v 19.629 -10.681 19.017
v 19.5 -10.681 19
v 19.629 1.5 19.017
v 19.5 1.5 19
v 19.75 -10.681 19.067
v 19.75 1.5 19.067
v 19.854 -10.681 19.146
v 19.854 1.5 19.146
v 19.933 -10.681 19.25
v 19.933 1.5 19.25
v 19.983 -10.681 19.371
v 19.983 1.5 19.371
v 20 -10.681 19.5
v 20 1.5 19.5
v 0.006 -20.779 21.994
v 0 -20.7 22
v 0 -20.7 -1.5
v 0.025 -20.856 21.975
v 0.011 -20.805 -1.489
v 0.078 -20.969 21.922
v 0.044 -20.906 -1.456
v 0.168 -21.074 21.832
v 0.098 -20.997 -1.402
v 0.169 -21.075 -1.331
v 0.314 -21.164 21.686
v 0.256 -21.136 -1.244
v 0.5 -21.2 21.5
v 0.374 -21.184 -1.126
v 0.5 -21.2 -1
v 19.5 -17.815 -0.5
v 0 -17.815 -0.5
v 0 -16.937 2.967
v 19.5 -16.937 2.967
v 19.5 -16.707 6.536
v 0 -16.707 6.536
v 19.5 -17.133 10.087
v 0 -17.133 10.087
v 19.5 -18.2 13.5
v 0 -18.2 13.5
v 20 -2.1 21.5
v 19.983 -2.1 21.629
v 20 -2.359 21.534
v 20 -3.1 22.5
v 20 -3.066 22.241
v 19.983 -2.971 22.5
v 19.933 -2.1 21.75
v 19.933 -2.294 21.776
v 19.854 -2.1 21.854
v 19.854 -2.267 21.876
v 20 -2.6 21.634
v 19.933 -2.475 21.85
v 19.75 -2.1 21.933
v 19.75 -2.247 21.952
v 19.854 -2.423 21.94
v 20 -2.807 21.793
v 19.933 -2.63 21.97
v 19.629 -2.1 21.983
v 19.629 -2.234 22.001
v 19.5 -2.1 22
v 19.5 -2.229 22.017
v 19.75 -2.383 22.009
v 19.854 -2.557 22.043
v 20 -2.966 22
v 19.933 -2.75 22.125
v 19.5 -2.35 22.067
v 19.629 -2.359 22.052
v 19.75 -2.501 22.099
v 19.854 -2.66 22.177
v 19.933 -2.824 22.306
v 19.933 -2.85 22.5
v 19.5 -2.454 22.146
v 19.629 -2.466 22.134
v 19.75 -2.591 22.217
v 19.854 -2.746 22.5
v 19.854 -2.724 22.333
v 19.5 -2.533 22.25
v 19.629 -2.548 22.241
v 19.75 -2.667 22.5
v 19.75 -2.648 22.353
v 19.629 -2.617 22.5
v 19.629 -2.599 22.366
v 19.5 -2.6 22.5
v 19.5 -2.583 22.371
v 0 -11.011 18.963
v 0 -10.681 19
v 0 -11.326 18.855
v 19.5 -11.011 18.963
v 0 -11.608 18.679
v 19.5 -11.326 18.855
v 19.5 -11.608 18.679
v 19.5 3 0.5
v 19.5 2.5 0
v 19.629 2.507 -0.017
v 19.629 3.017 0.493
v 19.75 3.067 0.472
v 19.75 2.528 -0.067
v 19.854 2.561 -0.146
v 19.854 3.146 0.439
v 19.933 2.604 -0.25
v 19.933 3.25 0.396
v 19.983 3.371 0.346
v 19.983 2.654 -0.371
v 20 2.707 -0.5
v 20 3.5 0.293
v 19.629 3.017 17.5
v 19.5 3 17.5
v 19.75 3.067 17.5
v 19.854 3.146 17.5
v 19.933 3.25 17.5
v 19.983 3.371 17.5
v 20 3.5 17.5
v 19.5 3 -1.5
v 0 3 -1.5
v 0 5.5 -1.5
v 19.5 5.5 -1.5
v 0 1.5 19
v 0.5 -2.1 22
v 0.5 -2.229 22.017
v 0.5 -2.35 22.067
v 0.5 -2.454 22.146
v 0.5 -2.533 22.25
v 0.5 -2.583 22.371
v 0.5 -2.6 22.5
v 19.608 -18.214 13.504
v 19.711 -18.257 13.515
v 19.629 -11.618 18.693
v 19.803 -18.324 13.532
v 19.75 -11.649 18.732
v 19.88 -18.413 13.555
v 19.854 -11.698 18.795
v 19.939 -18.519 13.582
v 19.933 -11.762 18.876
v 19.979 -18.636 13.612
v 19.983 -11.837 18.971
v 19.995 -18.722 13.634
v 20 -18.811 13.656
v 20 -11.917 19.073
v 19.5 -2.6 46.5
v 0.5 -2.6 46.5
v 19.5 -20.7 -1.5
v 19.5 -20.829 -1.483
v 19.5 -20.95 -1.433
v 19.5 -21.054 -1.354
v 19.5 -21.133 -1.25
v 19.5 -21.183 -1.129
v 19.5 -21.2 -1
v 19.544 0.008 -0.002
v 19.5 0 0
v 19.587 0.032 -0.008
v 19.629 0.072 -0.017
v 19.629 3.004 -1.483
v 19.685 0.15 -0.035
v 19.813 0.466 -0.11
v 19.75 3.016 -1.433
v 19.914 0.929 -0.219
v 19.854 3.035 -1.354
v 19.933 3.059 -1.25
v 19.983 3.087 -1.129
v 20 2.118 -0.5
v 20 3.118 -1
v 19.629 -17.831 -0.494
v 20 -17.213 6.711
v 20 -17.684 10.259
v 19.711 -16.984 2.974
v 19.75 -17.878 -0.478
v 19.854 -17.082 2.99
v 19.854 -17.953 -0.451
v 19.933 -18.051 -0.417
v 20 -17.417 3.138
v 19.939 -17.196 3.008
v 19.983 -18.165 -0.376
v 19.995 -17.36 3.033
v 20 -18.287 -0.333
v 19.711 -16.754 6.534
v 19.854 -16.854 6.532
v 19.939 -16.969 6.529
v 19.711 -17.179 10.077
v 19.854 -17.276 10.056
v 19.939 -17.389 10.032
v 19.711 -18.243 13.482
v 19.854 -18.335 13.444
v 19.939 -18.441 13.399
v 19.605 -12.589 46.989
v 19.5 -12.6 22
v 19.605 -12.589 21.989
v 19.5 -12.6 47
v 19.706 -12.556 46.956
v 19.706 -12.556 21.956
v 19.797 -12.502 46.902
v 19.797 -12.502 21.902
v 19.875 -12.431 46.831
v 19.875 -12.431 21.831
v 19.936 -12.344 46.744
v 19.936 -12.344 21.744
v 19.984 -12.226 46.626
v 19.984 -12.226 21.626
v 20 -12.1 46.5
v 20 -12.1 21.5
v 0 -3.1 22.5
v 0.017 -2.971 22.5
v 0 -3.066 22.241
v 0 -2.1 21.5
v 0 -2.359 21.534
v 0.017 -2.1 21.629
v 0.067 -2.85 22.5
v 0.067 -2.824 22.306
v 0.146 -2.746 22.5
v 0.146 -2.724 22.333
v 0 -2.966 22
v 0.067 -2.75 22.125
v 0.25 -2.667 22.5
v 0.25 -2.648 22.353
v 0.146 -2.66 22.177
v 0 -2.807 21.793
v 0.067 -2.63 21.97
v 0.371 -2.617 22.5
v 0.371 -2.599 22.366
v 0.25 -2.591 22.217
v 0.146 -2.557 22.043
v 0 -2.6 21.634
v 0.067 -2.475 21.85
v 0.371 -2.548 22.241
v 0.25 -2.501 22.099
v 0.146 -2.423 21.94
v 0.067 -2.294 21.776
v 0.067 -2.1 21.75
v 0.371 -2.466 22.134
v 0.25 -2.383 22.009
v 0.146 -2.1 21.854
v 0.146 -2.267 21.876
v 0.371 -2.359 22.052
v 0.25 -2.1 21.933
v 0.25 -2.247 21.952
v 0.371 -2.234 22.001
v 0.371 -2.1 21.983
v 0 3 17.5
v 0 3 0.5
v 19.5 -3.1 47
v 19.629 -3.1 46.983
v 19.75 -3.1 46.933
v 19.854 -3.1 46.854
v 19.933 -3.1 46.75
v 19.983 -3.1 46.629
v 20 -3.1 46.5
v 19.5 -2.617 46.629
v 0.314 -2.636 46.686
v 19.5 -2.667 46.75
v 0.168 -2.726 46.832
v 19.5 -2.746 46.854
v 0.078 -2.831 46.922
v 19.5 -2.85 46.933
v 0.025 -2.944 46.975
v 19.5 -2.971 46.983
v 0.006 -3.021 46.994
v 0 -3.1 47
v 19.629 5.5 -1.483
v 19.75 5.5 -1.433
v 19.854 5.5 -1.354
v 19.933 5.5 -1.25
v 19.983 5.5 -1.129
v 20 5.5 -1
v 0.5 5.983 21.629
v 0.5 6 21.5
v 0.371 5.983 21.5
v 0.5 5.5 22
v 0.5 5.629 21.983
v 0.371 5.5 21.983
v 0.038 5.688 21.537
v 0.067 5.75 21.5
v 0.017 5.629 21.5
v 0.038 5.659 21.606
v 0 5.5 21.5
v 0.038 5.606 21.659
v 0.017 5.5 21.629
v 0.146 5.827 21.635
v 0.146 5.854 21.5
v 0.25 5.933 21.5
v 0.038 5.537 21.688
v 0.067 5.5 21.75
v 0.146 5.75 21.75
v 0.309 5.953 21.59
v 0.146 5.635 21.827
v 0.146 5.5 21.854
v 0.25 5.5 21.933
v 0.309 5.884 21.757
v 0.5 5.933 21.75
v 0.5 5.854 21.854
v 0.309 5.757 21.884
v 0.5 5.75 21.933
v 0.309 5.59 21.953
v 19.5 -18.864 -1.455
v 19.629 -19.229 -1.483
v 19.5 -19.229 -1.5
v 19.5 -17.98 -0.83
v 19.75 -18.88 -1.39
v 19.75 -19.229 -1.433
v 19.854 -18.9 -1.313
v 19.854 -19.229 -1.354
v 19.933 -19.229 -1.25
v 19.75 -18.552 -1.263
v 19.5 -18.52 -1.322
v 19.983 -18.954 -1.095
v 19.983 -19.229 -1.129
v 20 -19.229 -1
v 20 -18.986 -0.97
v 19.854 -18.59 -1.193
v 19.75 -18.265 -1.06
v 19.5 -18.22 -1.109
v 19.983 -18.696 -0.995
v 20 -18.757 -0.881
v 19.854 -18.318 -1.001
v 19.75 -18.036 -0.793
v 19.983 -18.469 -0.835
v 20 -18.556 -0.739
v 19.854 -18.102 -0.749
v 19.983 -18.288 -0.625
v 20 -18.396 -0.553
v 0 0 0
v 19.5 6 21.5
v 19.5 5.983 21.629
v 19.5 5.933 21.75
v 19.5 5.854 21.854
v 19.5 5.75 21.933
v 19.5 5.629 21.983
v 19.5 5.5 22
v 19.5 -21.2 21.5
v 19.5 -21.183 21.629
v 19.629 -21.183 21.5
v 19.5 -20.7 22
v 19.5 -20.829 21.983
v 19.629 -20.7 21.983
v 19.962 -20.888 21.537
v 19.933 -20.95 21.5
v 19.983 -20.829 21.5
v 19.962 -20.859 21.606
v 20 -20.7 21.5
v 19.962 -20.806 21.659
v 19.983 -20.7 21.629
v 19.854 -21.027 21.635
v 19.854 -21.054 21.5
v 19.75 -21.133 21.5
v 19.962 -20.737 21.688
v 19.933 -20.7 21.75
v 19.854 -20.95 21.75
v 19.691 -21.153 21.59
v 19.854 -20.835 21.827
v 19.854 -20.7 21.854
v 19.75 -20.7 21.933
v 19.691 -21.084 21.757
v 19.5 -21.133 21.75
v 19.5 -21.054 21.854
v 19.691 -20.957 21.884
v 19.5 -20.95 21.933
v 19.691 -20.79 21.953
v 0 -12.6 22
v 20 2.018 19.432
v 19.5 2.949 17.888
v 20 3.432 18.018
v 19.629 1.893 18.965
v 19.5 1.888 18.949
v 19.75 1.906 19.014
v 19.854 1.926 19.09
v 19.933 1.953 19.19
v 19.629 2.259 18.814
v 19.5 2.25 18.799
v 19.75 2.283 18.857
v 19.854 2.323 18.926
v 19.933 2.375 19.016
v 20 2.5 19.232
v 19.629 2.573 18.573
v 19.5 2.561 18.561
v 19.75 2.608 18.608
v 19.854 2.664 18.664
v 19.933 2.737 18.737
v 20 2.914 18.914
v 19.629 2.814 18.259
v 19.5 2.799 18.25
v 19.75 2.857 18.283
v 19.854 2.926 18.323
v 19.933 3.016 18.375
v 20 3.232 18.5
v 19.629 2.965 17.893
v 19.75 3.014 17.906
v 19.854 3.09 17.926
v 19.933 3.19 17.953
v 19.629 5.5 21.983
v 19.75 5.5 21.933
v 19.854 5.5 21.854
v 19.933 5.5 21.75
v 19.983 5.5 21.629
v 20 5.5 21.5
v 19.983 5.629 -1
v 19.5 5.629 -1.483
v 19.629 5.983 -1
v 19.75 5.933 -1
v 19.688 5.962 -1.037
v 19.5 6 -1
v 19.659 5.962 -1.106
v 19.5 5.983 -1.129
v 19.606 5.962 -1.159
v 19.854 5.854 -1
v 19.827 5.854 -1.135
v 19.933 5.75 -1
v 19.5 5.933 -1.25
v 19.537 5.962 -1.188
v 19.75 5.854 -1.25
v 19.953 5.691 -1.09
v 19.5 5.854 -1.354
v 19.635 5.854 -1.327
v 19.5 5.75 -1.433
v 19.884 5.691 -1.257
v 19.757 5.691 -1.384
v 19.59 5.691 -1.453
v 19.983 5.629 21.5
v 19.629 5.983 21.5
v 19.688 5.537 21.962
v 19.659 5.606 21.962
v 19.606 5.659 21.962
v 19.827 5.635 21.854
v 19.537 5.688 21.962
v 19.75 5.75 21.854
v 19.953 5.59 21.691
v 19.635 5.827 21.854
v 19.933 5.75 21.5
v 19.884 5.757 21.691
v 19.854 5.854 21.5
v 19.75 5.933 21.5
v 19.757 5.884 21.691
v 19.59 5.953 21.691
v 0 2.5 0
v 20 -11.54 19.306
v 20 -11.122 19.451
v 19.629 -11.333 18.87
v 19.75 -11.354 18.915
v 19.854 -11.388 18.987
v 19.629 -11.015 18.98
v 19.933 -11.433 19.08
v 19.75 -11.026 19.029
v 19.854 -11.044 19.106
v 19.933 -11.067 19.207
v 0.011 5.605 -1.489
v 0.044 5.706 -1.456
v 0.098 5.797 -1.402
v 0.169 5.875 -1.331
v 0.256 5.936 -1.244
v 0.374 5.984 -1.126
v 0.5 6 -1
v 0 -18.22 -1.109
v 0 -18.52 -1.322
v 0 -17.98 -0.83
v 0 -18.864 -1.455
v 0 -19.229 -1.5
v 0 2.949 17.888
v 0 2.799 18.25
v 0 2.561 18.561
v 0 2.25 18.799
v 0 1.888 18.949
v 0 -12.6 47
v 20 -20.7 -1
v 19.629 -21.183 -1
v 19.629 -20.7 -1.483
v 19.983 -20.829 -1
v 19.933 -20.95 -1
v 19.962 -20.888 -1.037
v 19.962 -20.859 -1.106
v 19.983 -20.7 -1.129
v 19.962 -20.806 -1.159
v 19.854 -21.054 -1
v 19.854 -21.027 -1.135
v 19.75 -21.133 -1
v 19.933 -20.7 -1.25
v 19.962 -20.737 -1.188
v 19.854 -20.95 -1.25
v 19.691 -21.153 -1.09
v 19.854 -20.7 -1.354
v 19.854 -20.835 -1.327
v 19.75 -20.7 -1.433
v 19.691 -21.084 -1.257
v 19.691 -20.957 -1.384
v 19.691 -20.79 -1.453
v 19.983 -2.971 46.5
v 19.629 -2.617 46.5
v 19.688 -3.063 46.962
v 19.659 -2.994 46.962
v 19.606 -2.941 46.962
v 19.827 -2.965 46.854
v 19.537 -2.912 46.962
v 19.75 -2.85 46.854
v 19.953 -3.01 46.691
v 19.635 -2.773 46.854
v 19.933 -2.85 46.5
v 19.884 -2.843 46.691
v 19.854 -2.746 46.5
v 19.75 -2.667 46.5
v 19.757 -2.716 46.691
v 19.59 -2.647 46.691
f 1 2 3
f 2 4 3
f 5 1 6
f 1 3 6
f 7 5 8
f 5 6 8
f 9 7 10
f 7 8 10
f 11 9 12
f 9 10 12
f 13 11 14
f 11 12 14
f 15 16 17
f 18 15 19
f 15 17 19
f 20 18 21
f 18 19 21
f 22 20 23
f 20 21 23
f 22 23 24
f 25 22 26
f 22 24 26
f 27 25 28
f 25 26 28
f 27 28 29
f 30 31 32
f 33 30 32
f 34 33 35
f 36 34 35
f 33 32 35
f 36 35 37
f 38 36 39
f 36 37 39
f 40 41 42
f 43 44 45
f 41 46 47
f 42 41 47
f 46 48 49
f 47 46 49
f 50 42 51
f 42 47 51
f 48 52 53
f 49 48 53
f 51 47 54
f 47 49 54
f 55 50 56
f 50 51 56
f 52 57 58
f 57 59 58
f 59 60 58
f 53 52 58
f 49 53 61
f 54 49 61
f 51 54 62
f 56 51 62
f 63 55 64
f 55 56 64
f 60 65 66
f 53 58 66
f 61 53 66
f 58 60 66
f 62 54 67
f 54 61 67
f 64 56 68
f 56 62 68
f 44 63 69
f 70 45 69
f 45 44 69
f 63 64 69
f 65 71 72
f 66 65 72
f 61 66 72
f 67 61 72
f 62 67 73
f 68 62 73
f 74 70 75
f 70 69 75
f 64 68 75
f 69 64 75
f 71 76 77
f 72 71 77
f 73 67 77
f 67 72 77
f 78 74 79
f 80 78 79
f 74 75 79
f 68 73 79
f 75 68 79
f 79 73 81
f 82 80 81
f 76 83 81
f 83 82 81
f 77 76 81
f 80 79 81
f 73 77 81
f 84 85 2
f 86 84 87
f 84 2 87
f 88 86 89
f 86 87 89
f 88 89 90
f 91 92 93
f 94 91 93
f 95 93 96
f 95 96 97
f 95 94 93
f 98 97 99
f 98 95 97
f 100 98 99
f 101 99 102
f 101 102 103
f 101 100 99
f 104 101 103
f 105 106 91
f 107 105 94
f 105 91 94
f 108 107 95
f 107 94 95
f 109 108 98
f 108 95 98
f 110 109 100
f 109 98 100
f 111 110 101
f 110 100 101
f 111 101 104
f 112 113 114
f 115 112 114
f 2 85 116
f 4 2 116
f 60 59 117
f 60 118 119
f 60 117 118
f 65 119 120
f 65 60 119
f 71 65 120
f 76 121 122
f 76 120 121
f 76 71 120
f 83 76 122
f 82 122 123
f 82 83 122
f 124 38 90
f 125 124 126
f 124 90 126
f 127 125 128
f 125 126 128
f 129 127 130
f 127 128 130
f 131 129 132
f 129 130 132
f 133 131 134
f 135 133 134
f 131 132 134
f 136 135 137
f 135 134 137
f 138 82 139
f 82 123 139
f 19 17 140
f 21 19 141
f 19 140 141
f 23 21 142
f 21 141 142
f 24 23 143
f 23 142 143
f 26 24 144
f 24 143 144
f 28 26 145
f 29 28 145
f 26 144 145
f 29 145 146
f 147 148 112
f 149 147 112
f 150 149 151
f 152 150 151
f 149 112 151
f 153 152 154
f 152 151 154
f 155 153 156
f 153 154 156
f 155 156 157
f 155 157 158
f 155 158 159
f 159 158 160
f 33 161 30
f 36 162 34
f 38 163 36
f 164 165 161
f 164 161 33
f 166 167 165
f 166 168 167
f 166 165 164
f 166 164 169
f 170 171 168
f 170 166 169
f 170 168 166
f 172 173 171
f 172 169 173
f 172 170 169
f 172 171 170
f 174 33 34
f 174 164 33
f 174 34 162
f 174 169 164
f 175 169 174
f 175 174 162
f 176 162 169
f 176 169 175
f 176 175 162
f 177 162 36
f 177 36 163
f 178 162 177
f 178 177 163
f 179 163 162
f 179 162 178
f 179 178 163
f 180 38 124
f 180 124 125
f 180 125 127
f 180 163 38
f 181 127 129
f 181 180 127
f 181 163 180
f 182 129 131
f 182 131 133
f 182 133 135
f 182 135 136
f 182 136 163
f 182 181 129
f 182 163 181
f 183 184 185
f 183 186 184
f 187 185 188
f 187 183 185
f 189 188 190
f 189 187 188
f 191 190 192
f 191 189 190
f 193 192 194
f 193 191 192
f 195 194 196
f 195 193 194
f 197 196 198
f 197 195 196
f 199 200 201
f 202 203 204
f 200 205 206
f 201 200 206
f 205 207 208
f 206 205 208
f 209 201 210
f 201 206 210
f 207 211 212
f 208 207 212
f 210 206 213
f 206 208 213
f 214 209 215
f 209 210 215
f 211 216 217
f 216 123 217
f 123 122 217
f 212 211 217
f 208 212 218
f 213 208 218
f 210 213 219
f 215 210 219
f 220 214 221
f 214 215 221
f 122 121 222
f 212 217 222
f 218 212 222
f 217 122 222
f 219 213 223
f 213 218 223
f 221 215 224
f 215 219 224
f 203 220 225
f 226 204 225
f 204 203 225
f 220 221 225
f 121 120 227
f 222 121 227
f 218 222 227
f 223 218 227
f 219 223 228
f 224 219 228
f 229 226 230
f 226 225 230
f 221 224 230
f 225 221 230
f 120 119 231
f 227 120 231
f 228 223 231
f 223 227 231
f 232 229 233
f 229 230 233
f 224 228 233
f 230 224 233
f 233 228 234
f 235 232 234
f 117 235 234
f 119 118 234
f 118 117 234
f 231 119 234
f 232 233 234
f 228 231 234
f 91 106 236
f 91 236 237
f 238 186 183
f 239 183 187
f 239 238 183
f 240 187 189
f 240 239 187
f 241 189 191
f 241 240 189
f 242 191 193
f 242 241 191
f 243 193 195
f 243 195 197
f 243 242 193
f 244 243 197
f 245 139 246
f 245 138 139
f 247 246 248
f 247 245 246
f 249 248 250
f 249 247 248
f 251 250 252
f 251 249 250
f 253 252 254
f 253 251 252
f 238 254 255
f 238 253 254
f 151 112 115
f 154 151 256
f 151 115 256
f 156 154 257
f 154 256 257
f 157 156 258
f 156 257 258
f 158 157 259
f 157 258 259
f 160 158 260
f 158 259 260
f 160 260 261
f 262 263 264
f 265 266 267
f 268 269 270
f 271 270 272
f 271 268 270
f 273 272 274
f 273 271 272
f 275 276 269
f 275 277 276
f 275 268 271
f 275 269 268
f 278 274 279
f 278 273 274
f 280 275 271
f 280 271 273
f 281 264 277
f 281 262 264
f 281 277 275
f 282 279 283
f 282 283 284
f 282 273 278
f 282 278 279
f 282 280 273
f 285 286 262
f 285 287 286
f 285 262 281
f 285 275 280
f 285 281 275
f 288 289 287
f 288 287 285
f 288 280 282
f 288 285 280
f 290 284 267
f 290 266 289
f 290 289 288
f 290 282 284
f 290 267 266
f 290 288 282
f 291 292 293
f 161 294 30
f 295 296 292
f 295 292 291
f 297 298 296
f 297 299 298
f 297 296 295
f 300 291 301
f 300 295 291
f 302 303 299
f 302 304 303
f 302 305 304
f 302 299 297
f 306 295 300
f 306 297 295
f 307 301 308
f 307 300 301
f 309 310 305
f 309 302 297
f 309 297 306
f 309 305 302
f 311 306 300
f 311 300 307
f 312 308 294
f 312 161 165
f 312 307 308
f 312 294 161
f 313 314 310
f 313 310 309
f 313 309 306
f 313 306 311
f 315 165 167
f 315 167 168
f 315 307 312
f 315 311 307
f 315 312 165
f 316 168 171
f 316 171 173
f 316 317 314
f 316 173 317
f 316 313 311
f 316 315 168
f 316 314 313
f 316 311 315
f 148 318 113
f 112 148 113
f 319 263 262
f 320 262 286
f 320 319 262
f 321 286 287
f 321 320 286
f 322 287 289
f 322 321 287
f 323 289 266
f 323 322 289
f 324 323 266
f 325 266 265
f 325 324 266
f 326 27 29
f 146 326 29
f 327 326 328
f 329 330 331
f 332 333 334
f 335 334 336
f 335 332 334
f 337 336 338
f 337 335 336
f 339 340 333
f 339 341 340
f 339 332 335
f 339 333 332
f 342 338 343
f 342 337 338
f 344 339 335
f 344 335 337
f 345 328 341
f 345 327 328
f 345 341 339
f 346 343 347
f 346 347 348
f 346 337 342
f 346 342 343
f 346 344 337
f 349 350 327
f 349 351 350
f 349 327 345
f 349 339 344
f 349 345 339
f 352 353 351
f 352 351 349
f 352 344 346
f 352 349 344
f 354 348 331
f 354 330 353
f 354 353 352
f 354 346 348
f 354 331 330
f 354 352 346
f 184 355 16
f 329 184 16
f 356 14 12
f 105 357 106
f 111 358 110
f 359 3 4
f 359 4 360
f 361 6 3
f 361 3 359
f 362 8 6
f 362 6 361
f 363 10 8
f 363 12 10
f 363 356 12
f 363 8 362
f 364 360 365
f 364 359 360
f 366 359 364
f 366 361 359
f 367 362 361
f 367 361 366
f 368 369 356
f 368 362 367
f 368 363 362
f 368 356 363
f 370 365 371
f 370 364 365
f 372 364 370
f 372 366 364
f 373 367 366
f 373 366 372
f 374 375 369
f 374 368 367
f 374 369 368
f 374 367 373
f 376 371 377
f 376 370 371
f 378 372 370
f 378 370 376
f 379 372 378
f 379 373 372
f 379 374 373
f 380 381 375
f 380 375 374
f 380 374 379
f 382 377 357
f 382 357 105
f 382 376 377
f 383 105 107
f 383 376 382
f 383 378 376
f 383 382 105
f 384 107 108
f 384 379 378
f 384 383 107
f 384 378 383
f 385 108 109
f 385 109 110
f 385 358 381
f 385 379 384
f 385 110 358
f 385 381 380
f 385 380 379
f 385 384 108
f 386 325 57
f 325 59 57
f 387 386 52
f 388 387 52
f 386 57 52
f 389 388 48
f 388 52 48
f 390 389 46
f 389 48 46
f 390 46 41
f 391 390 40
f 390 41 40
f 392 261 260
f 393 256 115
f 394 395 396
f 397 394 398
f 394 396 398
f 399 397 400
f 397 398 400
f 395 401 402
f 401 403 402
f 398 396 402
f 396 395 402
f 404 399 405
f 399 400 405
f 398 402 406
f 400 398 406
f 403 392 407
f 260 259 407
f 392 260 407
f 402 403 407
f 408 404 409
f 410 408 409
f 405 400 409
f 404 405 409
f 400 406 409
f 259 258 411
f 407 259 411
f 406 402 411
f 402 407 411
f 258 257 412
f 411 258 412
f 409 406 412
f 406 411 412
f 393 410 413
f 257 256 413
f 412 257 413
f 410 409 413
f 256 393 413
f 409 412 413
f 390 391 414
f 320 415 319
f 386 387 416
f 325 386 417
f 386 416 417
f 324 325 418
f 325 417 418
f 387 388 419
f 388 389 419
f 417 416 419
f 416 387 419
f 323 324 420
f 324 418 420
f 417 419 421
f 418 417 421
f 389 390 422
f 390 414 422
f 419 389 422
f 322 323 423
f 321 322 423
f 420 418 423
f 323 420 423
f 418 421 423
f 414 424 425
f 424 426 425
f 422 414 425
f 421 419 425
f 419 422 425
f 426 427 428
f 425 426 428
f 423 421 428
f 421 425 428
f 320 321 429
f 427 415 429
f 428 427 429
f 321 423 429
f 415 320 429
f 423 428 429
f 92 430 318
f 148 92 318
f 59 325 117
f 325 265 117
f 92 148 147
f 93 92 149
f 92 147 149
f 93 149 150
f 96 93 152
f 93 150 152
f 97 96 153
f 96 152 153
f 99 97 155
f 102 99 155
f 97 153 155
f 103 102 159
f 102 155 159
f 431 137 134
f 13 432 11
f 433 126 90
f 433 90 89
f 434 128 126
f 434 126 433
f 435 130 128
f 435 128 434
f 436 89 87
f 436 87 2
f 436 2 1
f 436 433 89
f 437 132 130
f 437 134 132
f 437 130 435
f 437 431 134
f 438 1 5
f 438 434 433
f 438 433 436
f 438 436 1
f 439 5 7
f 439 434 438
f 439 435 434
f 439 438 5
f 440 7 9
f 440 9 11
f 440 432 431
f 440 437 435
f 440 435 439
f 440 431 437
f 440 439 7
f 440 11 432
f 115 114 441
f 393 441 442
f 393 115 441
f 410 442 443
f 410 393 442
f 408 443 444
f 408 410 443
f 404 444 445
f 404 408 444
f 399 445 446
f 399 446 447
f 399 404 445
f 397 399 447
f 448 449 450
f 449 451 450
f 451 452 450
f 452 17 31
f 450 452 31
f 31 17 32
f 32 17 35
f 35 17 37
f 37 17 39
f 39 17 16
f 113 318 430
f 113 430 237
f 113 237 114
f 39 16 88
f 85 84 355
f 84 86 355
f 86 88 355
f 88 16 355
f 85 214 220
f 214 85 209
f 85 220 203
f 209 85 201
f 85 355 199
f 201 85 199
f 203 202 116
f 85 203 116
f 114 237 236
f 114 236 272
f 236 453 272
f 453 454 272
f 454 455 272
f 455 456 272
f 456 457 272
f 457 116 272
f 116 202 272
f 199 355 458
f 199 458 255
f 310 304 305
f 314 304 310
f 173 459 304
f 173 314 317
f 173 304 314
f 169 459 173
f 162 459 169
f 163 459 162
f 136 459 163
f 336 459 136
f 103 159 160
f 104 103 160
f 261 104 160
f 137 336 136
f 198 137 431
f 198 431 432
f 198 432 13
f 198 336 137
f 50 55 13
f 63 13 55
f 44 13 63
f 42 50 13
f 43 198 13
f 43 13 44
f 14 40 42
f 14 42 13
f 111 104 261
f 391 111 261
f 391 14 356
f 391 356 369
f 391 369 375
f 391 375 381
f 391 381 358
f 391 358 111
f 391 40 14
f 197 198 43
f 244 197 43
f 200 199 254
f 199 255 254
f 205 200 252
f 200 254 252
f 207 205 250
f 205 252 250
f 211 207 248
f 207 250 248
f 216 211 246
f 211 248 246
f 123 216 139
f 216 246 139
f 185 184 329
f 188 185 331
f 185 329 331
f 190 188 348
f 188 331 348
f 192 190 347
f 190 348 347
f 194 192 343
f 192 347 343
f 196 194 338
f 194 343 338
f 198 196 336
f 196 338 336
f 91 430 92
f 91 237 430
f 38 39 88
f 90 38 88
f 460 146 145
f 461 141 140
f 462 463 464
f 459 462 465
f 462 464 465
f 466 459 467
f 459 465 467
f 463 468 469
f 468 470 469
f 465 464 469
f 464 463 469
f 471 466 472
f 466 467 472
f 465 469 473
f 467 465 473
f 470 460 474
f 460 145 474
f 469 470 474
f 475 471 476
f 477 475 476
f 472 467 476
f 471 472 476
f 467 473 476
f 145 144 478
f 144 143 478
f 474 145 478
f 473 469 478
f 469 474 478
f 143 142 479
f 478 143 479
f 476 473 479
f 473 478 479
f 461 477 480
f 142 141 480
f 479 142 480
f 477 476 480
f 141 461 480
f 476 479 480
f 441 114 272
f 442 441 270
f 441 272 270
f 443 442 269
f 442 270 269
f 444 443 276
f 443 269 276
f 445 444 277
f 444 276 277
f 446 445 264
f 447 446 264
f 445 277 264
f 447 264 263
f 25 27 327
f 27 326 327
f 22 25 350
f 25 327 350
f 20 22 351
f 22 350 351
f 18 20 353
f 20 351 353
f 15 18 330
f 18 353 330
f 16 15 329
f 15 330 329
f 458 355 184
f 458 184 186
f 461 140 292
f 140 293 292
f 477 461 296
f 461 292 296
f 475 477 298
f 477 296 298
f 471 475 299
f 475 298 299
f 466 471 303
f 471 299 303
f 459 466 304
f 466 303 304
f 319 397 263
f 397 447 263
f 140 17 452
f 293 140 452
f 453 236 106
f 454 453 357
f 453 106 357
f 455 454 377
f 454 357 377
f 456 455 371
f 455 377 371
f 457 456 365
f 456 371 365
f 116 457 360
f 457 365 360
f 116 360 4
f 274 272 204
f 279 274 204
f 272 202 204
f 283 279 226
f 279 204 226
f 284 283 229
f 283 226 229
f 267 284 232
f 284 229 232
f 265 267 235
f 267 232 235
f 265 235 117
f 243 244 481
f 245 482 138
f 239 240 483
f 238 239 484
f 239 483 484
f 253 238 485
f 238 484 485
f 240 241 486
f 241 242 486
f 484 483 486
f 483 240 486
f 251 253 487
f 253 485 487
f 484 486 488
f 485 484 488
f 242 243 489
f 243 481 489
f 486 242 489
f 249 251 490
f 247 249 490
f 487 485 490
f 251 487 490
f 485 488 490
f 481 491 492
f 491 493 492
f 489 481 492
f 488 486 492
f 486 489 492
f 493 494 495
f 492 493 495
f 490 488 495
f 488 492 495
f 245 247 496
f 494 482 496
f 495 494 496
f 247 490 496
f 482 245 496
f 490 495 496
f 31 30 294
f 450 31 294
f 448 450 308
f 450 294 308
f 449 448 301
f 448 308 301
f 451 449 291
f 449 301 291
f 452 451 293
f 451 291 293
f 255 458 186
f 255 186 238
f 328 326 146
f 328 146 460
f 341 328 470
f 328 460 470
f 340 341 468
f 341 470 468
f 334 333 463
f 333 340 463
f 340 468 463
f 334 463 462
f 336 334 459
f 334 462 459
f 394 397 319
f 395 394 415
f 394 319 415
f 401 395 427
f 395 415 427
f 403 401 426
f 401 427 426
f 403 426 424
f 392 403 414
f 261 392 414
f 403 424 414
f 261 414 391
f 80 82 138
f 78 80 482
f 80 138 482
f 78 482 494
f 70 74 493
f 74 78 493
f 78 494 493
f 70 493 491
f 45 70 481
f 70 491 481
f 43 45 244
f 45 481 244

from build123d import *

# Parameters (mm, degrees)
F0_W     = 10
F0_H     = 25
F1_DEPTH = 20
F2_SIZE  = 0.5
F3_R     = 1.5
F4_R     = 0.5


with BuildPart() as f1:
    # F0 (on Right) → F1 (new body)
    with BuildSketch(Plane.YZ):
        Polygon((3, 0), (0, 0), (3, -1.5), align=None)
        Polygon((3, 19), (3, 0), (3, -1.5), (6, -1.5), (6, 22), (-2.6, 22), (-12.6, 22), (-21.2, 22), (-21.2, -1.5), (-18.2, -1.5), (-18.2, 13.5), (-18.2, 19), (-11.2, 19), align=None)
        Polygon((-18.2, 13.5), (-11.2, 19), (-18.2, 19), align=None)
        with BuildLine():
            ThreePointArc((-18.2, -1.5), (-16.7, 6), (-18.2, 13.5))
            Line((-18.2, 13.5), (-18.2, -1.5))
        make_face()
        with Locations((-7.6, 34.5)):
            Rectangle(F0_W, F0_H)
    extrude(amount=F1_DEPTH)

    # F2
    f2_edges = [f1.edges().sort_by_distance(p)[0] for p in [
        (10, 3, 0),
    ]]
    chamfer(f2_edges, length=F2_SIZE)

    # F3
    f3_edges = [f1.edges().sort_by_distance(p)[0] for p in [
        (10, 3, 19),
        (10, -11.2, 19),
        (10, -18.2, -1.5),
    ]]
    fillet(f3_edges, radius=F3_R)

    # F4
    f4_edges = [f1.edges().sort_by_distance(p)[0] for p in [
        (10, -21.2, 22),
        (10, -21.2, -1.5),
        (0, -21.2, 10.25),
        (20, -21.2, 10.25),
        (20, 3, 9),
        (20, 2.56066, 18.56066),
        (20, 2.75, 0.25),
        (20, -4.590603, 19),
        (20, 1.25, 0),
        (20, -11.171503, 18.917606),
        (20, 1.5, -0.75),
        (20, -14.903969, 16.089739),
        (20, 4.5, -1.5),
        (20, -16.707361, 6.535736),
        (20, 6, 10.25),
        (20, -18.363412, -1.224745),
        (20, 1.7, 22),
        (20, -20.214719, -1.5),
        (20, -2.6, 34.5),
        (20, -7.6, 47),
        (20, -16.9, 22),
        (20, -12.6, 34.5),
        (10, 6, -1.5),
        (10, 6, 22),
        (0, 6, 10.25),
        (10, -2.6, 22),
        (10, -2.6, 47),
        (0, -2.6, 34.5),
        (0, 1.7, 22),
    ]]
    fillet(f4_edges, radius=F4_R)


solid = f1.part
